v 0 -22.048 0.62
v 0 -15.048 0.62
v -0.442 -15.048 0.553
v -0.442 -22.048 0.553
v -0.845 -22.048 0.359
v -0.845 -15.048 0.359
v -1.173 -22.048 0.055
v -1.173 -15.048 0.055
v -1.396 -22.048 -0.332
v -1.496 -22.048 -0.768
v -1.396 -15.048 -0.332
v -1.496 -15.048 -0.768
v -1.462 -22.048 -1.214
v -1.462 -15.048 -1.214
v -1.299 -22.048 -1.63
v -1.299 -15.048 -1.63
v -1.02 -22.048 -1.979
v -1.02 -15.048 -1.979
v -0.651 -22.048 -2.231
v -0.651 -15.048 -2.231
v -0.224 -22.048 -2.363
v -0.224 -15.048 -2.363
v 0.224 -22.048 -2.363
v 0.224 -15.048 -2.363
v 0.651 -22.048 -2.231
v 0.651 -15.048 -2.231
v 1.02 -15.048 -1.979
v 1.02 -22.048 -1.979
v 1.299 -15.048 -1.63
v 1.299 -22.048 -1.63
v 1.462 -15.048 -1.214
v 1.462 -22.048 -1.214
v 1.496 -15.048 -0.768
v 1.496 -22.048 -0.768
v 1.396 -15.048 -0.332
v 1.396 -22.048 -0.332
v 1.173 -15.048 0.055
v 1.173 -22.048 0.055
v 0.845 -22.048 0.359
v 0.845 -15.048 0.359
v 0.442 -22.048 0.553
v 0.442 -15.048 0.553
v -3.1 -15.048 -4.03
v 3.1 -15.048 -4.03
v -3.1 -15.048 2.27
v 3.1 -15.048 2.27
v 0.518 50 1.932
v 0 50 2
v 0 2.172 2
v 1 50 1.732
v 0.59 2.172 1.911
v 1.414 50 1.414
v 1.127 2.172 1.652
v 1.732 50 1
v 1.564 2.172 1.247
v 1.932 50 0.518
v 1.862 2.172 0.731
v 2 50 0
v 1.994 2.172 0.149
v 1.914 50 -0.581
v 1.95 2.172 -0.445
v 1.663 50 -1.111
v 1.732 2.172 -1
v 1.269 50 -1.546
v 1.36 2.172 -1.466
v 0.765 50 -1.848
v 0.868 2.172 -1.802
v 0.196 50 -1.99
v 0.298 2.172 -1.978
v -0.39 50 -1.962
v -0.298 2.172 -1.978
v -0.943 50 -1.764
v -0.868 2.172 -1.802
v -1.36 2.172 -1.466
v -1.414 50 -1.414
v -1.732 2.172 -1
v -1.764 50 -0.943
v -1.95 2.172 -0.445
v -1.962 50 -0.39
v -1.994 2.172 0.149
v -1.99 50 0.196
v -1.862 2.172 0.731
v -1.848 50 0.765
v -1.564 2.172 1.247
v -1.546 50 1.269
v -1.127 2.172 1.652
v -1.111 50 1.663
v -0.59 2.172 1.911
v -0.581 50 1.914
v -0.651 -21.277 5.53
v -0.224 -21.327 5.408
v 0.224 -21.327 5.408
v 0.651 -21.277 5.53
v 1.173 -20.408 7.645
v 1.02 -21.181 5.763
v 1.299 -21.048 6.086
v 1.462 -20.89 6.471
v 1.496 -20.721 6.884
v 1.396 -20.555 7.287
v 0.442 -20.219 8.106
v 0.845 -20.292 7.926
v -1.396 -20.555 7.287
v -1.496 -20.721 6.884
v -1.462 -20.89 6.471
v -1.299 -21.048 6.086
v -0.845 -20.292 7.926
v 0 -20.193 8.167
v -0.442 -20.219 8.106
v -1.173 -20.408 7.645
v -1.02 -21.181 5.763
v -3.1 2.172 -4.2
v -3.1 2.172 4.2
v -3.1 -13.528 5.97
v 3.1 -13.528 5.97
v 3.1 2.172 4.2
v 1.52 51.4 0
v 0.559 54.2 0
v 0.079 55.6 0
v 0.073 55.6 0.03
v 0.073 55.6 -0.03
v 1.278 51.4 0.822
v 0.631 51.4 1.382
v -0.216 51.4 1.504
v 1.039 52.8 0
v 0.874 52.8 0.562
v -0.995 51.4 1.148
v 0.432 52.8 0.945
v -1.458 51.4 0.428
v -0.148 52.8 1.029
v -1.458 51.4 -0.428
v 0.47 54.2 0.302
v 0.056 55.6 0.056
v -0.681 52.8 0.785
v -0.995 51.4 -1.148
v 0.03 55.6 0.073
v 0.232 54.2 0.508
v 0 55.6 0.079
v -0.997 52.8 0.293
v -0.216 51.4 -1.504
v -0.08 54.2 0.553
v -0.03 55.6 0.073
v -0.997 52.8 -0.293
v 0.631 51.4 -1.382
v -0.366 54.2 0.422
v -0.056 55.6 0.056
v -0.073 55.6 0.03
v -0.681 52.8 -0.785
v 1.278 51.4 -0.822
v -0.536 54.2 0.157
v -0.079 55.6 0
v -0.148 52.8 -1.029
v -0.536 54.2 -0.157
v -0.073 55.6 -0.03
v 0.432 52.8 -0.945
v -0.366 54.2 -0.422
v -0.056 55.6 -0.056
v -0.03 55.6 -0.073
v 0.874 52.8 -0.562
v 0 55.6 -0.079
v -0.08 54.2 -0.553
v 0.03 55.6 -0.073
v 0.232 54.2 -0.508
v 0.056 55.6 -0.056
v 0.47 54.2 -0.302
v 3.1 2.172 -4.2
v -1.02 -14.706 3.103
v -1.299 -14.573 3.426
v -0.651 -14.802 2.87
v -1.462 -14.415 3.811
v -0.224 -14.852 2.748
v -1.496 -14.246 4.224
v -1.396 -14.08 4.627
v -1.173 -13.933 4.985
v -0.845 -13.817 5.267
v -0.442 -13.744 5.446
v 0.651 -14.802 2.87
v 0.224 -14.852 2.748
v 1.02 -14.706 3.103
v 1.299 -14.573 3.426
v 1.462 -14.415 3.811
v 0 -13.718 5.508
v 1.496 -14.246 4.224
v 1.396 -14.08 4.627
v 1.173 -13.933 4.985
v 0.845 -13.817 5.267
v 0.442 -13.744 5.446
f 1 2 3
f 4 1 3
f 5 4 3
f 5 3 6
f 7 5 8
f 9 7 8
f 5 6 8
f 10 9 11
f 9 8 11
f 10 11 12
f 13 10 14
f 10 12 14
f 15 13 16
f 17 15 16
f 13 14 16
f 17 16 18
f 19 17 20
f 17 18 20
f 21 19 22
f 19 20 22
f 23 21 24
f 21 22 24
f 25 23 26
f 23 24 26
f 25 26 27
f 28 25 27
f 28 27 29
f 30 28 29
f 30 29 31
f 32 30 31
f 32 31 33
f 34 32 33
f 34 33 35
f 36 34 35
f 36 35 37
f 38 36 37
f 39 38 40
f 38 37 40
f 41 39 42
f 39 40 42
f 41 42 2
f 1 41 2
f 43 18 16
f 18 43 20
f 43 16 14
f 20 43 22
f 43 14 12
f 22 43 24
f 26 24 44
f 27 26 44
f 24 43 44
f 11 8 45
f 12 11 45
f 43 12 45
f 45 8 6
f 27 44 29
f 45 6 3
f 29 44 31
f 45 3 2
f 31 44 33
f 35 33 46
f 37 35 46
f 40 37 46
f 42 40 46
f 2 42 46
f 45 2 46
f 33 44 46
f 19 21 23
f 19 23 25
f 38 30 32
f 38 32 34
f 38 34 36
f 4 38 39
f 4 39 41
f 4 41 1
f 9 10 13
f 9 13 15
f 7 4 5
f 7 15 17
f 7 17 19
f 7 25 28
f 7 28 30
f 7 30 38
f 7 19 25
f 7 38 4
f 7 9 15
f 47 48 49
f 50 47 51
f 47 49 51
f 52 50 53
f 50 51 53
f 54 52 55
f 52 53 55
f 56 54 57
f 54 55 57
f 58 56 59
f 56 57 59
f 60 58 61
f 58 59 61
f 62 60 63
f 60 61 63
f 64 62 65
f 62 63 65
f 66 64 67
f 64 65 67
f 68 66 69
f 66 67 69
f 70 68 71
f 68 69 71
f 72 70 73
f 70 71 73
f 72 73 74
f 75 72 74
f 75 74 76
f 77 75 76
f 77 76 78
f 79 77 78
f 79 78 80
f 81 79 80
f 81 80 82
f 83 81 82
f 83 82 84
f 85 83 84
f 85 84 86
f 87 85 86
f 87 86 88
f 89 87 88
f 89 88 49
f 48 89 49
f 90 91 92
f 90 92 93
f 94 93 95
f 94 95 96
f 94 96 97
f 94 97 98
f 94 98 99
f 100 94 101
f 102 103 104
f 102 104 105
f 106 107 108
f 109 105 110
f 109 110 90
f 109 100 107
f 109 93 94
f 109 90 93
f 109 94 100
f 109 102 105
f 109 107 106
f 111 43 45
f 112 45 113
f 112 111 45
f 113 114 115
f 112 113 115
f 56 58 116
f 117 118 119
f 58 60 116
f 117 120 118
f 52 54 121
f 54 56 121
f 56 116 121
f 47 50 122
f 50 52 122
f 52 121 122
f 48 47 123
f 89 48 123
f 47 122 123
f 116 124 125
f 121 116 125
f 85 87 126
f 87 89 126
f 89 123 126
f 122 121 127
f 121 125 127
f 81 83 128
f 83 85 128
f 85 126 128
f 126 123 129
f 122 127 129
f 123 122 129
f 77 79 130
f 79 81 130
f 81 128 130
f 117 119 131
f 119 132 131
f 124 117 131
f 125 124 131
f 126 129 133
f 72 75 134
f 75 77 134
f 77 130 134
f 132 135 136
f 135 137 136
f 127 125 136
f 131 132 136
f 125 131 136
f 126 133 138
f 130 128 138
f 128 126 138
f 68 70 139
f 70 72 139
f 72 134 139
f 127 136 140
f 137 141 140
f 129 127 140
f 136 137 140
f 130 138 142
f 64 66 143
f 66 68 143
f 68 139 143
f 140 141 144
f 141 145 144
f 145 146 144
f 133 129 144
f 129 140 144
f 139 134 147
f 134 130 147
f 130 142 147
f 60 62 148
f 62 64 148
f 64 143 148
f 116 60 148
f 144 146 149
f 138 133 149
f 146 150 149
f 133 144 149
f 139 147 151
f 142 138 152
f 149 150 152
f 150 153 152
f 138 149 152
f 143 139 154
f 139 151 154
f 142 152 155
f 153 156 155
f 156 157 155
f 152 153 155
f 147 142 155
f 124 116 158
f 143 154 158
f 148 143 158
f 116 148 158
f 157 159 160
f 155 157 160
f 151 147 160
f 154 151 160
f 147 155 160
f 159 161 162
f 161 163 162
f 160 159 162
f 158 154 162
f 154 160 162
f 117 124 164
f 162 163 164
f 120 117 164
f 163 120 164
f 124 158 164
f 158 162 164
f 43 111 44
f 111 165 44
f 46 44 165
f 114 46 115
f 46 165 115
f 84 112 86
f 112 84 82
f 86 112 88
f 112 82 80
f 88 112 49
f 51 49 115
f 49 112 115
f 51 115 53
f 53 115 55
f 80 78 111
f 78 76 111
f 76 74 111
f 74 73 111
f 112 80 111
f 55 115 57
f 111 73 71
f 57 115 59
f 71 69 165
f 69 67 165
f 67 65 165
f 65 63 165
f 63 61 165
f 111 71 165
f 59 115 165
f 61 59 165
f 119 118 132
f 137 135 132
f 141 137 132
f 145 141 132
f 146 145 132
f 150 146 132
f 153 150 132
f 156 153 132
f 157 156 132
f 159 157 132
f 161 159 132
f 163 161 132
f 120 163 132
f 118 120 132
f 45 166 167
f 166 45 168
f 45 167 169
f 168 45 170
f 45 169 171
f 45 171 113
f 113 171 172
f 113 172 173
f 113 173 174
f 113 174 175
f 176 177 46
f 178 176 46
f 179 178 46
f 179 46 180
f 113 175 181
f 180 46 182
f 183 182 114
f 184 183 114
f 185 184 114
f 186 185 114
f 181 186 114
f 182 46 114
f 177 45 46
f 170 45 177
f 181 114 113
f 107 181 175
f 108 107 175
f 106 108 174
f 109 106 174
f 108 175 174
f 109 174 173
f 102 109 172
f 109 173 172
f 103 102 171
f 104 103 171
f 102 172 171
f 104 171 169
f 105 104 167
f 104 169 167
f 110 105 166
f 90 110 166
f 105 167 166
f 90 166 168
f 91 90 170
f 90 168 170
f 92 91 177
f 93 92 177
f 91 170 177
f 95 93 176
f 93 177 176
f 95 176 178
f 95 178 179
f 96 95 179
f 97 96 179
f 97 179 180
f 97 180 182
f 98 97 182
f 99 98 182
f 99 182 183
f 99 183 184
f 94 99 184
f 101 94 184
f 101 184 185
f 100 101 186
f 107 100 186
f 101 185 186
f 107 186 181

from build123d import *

# Parameters (mm, degrees)
SKETCH1_R           = 2
BOSS_EXTRUDE1_DEPTH = 50
BOSS_EXTRUDE2_DEPTH = 3.1
SKETCH4_R           = 1.5
BOSS_EXTRUDE3_DEPTH = 7
SKETCH5_R           = 1.5
BOSS_EXTRUDE4_DEPTH = 7


with BuildPart() as part:
    # Sketch1 → Boss-Extrude1 (new body)
    with BuildSketch(Plane(origin=(0, 0, 0), x_dir=(1, 0, 0), z_dir=(0, 1, 0))):
        with Locations(Location((0, 0, 0), (0, 0, 270))):
            Circle(SKETCH1_R)
    extrude(amount=BOSS_EXTRUDE1_DEPTH)

    # Sketch2 → Revolve1 (revolve)
    with BuildSketch(Plane.XY):
        Polygon((0, 55.6), (0, 50), (2, 50), (0.078528032, 55.6), align=None)
    revolve(axis=Axis((0, 55.6, 0), (0, -1, 0)))

    # Sketch3 → Boss-Extrude2 (add, symmetric)
    with BuildSketch(Plane(origin=(0, 0, 0), x_dir=(0, 0, -1), z_dir=(1, 0, 0))):
        Polygon((-4.2, 2.171539087), (4.2, 2.171539087), (4.029893124, -15.048329328), (-2.270106876, -15.048329328), (-5.970106876, -13.528460913), align=None)
    extrude(amount=BOSS_EXTRUDE2_DEPTH, both=True)

    # Sketch4 → Boss-Extrude3 (add)
    with BuildSketch(Plane(origin=(0, -13.673600271, 5.616776534), x_dir=(-1, 0, 0), z_dir=(0, -0.9250000000000002, 0.37996710383926635))):
        with Locations(Location((0, 1.618021252, 0), (0, 0, 270))):
            Circle(SKETCH4_R)
    extrude(amount=BOSS_EXTRUDE3_DEPTH)

    # Sketch5 → Boss-Extrude4 (add)
    with BuildSketch(Plane(origin=(0, -15.048329328, 0), x_dir=(-1, 0, 0), z_dir=(0, -1, 0))):
        with Locations(Location((0, 0.879893124, 0), (0, 0, 270))):
            Circle(SKETCH5_R)
    extrude(amount=BOSS_EXTRUDE4_DEPTH)


solid = part.part
